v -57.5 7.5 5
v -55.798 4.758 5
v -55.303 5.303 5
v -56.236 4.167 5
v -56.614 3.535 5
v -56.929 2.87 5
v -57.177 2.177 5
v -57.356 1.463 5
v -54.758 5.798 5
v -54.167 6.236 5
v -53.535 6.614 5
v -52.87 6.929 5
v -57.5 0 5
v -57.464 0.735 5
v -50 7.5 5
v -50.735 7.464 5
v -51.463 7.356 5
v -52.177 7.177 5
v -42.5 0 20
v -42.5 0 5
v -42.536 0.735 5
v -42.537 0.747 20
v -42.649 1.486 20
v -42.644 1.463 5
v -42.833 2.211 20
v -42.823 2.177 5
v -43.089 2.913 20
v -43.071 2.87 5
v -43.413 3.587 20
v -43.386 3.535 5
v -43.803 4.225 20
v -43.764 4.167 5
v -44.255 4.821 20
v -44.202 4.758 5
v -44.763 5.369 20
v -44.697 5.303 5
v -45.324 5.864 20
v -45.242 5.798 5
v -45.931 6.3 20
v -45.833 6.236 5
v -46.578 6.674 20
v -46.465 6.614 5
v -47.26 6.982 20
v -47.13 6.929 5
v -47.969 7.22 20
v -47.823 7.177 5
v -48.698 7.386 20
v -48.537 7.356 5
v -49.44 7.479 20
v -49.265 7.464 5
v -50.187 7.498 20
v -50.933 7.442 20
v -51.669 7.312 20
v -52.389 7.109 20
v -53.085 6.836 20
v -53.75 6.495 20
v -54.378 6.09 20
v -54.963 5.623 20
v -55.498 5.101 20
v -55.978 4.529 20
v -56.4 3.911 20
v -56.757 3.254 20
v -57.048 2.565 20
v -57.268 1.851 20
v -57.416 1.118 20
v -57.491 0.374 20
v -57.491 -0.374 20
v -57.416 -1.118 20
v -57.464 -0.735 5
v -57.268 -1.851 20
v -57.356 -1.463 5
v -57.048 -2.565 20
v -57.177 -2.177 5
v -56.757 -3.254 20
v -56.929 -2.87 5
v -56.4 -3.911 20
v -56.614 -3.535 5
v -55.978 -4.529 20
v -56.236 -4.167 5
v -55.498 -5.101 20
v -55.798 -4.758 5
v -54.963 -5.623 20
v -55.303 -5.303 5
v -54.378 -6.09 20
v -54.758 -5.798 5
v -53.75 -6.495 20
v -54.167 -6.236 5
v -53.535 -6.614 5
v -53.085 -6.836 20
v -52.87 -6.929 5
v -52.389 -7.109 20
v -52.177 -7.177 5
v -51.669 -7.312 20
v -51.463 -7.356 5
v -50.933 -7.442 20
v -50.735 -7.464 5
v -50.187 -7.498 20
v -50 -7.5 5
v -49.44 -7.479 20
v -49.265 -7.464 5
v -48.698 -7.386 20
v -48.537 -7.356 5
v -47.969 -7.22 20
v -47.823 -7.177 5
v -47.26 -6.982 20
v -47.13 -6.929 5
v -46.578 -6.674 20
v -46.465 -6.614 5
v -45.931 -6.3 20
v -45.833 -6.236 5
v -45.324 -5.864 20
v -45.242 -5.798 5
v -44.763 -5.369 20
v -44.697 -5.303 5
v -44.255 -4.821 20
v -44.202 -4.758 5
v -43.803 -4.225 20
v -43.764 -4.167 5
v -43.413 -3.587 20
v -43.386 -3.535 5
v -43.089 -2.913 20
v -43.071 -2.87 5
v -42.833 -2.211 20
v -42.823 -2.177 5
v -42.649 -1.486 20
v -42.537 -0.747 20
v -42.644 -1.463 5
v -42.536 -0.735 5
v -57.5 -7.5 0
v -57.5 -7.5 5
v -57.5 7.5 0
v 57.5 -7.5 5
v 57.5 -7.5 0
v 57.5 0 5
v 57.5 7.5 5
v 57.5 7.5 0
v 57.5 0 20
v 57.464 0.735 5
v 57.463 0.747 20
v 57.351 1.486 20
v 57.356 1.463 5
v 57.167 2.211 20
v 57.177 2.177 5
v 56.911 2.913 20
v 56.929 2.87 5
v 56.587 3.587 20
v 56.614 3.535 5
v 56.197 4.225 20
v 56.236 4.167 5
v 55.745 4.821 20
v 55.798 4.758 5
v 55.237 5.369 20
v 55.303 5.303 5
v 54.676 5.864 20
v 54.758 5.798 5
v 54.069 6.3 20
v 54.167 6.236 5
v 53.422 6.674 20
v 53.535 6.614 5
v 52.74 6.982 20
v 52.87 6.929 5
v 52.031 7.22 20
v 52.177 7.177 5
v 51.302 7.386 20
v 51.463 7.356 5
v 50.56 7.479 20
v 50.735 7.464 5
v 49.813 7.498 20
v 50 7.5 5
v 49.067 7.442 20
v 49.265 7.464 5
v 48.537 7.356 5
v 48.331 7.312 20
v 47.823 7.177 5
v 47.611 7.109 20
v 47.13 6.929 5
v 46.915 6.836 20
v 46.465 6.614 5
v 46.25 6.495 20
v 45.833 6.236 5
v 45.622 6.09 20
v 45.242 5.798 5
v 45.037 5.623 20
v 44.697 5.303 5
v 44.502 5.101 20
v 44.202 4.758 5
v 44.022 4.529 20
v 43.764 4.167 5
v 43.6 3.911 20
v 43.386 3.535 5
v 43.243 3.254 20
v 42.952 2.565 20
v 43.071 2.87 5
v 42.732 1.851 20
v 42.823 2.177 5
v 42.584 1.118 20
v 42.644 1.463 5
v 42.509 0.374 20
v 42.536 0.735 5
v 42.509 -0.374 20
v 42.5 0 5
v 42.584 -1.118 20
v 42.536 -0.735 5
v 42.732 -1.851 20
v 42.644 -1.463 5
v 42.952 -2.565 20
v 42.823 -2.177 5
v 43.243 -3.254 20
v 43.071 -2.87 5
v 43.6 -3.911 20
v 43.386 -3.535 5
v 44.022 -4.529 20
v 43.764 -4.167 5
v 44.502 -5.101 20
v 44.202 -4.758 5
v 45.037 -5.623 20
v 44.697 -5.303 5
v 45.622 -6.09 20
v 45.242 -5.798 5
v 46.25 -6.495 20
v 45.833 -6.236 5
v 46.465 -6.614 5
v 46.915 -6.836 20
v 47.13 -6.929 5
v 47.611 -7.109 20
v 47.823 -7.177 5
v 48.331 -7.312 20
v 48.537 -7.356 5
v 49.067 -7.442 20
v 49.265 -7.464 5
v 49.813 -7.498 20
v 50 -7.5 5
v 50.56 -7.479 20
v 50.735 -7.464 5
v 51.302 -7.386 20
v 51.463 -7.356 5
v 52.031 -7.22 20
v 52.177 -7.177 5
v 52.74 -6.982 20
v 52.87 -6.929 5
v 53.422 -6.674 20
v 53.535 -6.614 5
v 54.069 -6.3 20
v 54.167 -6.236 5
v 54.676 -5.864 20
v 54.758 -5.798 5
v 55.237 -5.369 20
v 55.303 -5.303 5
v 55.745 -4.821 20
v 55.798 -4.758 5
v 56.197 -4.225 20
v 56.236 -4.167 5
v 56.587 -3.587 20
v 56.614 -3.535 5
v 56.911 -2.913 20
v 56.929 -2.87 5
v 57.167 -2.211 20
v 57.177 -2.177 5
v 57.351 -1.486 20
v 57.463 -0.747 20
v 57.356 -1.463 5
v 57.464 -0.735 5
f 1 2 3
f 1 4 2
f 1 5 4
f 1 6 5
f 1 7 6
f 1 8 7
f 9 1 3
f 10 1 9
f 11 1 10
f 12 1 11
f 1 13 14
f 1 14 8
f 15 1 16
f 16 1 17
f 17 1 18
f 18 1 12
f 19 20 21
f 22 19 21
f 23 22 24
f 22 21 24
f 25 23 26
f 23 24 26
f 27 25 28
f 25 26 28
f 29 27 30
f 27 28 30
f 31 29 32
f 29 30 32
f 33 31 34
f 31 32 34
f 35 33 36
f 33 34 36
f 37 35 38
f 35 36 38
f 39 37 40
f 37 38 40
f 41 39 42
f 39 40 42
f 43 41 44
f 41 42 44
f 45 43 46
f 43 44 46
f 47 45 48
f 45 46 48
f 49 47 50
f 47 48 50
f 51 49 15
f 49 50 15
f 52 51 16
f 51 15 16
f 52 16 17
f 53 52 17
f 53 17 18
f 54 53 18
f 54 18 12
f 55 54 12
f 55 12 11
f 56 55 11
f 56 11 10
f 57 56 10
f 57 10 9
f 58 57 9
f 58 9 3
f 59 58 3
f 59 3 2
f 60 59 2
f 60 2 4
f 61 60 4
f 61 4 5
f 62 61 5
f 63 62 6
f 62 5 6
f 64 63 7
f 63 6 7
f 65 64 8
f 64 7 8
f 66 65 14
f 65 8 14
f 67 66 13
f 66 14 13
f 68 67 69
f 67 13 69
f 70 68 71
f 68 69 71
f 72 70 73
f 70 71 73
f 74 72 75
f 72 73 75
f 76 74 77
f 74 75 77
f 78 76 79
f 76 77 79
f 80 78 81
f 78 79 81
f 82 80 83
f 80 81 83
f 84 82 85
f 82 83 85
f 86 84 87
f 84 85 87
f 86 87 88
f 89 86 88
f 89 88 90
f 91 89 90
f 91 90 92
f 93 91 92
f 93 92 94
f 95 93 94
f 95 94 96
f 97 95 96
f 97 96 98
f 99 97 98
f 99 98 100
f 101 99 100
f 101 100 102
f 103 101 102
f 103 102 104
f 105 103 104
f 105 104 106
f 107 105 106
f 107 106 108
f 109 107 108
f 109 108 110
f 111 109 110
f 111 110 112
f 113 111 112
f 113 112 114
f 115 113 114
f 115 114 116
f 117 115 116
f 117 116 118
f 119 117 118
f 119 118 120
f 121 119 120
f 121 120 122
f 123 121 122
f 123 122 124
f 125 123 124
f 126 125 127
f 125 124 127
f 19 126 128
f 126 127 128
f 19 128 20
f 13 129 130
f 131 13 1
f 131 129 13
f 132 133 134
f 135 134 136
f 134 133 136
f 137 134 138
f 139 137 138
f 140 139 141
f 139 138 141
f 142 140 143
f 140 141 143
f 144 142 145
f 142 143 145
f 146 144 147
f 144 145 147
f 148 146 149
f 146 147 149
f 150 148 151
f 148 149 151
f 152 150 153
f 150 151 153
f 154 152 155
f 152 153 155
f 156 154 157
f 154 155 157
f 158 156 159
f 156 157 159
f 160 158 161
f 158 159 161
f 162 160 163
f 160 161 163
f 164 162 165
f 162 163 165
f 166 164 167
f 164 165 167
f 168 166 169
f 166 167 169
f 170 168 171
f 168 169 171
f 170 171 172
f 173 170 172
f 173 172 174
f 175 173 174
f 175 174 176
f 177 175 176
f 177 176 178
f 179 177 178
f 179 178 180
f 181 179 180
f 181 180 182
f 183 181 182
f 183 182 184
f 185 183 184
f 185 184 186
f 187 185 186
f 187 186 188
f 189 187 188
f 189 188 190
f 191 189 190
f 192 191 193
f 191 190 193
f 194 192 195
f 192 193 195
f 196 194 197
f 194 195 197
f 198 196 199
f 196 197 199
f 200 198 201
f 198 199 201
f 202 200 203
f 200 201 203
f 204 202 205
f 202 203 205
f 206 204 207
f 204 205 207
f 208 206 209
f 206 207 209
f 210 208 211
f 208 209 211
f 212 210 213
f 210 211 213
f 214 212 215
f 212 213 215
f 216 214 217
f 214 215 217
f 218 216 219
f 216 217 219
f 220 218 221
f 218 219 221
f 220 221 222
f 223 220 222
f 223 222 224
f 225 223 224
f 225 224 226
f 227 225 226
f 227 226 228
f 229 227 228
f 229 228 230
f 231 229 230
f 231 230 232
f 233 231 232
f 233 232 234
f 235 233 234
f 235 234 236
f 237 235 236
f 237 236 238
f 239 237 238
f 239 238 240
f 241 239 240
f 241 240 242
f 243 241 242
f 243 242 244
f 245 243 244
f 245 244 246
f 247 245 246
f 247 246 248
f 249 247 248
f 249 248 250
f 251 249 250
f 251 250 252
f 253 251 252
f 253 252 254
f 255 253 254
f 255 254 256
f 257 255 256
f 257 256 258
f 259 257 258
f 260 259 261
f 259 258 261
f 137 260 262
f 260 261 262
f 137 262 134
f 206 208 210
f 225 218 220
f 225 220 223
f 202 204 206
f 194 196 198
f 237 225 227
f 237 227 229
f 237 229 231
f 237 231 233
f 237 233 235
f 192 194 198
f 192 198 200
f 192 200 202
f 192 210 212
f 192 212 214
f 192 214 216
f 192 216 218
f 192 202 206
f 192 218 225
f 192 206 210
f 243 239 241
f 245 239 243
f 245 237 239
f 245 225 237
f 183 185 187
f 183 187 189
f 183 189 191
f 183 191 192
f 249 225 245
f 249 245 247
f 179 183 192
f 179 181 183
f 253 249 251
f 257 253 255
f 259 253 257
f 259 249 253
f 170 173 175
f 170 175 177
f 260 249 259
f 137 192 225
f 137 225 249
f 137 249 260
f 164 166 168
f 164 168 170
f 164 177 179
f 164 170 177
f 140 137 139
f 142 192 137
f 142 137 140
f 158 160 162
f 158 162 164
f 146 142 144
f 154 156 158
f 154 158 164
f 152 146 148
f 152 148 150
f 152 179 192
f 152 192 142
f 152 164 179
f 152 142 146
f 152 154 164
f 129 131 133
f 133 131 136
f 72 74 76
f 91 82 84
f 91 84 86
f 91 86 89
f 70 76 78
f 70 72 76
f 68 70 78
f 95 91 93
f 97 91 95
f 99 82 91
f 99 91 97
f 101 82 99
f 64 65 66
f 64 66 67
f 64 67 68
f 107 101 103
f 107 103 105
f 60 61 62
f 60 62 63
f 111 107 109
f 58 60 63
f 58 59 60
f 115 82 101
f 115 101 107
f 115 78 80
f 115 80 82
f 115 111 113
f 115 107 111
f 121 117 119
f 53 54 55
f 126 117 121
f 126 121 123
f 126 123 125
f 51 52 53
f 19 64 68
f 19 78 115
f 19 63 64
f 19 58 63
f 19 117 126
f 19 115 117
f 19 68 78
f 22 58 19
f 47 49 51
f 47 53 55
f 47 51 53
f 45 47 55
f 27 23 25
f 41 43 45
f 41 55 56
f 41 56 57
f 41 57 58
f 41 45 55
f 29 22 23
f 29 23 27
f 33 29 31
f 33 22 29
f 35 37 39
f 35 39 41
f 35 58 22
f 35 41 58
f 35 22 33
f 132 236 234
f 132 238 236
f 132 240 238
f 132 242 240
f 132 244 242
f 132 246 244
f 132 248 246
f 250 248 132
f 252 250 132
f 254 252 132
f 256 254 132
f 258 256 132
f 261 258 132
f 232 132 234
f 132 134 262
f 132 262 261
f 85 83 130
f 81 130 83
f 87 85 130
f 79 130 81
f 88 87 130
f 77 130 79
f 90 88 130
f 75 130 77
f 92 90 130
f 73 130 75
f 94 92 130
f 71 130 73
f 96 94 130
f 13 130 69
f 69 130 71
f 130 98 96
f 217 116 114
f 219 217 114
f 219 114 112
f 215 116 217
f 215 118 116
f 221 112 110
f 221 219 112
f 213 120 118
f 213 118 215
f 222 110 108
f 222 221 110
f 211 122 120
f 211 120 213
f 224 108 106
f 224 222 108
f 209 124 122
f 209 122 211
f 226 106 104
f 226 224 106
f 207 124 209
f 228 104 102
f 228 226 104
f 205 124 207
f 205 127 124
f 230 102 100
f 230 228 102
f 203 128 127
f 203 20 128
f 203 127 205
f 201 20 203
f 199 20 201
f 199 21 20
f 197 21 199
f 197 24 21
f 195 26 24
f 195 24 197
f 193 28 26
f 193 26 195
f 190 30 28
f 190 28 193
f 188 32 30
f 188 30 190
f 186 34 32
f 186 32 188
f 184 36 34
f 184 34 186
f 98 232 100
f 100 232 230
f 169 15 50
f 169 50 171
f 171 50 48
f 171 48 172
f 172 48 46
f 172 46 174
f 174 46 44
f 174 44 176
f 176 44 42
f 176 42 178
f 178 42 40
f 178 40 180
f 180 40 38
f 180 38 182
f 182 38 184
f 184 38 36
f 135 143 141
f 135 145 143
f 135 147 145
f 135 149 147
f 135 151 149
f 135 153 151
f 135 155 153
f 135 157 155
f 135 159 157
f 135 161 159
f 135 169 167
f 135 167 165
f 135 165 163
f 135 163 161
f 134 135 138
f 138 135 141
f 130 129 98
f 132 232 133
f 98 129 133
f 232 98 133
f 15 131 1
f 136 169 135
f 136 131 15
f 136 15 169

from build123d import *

# Parameters (mm, degrees)
F0_W     = 115
F0_H     = 15
F1_DEPTH = 5
F2_R     = 7.5
F3_DEPTH = 15


with BuildPart() as f1:
    # F0 (on Top) → F1 (new body)
    with BuildSketch(Plane.XY):
        Rectangle(F0_W, F0_H)
    extrude(amount=F1_DEPTH)

    # F2 (on face) → F3 (join)
    with BuildSketch(Plane.XY.offset(5)):
        with BuildLine():
            ThreePointArc((-57.5, 0), (-50, -7.5), (-42.5, 0))
            ThreePointArc((-42.5, 0), (-50, 7.5), (-57.5, 0))
        make_face()
        with Locations((50, 0)):
            Circle(F2_R)
    extrude(amount=F3_DEPTH)


solid = f1.part
